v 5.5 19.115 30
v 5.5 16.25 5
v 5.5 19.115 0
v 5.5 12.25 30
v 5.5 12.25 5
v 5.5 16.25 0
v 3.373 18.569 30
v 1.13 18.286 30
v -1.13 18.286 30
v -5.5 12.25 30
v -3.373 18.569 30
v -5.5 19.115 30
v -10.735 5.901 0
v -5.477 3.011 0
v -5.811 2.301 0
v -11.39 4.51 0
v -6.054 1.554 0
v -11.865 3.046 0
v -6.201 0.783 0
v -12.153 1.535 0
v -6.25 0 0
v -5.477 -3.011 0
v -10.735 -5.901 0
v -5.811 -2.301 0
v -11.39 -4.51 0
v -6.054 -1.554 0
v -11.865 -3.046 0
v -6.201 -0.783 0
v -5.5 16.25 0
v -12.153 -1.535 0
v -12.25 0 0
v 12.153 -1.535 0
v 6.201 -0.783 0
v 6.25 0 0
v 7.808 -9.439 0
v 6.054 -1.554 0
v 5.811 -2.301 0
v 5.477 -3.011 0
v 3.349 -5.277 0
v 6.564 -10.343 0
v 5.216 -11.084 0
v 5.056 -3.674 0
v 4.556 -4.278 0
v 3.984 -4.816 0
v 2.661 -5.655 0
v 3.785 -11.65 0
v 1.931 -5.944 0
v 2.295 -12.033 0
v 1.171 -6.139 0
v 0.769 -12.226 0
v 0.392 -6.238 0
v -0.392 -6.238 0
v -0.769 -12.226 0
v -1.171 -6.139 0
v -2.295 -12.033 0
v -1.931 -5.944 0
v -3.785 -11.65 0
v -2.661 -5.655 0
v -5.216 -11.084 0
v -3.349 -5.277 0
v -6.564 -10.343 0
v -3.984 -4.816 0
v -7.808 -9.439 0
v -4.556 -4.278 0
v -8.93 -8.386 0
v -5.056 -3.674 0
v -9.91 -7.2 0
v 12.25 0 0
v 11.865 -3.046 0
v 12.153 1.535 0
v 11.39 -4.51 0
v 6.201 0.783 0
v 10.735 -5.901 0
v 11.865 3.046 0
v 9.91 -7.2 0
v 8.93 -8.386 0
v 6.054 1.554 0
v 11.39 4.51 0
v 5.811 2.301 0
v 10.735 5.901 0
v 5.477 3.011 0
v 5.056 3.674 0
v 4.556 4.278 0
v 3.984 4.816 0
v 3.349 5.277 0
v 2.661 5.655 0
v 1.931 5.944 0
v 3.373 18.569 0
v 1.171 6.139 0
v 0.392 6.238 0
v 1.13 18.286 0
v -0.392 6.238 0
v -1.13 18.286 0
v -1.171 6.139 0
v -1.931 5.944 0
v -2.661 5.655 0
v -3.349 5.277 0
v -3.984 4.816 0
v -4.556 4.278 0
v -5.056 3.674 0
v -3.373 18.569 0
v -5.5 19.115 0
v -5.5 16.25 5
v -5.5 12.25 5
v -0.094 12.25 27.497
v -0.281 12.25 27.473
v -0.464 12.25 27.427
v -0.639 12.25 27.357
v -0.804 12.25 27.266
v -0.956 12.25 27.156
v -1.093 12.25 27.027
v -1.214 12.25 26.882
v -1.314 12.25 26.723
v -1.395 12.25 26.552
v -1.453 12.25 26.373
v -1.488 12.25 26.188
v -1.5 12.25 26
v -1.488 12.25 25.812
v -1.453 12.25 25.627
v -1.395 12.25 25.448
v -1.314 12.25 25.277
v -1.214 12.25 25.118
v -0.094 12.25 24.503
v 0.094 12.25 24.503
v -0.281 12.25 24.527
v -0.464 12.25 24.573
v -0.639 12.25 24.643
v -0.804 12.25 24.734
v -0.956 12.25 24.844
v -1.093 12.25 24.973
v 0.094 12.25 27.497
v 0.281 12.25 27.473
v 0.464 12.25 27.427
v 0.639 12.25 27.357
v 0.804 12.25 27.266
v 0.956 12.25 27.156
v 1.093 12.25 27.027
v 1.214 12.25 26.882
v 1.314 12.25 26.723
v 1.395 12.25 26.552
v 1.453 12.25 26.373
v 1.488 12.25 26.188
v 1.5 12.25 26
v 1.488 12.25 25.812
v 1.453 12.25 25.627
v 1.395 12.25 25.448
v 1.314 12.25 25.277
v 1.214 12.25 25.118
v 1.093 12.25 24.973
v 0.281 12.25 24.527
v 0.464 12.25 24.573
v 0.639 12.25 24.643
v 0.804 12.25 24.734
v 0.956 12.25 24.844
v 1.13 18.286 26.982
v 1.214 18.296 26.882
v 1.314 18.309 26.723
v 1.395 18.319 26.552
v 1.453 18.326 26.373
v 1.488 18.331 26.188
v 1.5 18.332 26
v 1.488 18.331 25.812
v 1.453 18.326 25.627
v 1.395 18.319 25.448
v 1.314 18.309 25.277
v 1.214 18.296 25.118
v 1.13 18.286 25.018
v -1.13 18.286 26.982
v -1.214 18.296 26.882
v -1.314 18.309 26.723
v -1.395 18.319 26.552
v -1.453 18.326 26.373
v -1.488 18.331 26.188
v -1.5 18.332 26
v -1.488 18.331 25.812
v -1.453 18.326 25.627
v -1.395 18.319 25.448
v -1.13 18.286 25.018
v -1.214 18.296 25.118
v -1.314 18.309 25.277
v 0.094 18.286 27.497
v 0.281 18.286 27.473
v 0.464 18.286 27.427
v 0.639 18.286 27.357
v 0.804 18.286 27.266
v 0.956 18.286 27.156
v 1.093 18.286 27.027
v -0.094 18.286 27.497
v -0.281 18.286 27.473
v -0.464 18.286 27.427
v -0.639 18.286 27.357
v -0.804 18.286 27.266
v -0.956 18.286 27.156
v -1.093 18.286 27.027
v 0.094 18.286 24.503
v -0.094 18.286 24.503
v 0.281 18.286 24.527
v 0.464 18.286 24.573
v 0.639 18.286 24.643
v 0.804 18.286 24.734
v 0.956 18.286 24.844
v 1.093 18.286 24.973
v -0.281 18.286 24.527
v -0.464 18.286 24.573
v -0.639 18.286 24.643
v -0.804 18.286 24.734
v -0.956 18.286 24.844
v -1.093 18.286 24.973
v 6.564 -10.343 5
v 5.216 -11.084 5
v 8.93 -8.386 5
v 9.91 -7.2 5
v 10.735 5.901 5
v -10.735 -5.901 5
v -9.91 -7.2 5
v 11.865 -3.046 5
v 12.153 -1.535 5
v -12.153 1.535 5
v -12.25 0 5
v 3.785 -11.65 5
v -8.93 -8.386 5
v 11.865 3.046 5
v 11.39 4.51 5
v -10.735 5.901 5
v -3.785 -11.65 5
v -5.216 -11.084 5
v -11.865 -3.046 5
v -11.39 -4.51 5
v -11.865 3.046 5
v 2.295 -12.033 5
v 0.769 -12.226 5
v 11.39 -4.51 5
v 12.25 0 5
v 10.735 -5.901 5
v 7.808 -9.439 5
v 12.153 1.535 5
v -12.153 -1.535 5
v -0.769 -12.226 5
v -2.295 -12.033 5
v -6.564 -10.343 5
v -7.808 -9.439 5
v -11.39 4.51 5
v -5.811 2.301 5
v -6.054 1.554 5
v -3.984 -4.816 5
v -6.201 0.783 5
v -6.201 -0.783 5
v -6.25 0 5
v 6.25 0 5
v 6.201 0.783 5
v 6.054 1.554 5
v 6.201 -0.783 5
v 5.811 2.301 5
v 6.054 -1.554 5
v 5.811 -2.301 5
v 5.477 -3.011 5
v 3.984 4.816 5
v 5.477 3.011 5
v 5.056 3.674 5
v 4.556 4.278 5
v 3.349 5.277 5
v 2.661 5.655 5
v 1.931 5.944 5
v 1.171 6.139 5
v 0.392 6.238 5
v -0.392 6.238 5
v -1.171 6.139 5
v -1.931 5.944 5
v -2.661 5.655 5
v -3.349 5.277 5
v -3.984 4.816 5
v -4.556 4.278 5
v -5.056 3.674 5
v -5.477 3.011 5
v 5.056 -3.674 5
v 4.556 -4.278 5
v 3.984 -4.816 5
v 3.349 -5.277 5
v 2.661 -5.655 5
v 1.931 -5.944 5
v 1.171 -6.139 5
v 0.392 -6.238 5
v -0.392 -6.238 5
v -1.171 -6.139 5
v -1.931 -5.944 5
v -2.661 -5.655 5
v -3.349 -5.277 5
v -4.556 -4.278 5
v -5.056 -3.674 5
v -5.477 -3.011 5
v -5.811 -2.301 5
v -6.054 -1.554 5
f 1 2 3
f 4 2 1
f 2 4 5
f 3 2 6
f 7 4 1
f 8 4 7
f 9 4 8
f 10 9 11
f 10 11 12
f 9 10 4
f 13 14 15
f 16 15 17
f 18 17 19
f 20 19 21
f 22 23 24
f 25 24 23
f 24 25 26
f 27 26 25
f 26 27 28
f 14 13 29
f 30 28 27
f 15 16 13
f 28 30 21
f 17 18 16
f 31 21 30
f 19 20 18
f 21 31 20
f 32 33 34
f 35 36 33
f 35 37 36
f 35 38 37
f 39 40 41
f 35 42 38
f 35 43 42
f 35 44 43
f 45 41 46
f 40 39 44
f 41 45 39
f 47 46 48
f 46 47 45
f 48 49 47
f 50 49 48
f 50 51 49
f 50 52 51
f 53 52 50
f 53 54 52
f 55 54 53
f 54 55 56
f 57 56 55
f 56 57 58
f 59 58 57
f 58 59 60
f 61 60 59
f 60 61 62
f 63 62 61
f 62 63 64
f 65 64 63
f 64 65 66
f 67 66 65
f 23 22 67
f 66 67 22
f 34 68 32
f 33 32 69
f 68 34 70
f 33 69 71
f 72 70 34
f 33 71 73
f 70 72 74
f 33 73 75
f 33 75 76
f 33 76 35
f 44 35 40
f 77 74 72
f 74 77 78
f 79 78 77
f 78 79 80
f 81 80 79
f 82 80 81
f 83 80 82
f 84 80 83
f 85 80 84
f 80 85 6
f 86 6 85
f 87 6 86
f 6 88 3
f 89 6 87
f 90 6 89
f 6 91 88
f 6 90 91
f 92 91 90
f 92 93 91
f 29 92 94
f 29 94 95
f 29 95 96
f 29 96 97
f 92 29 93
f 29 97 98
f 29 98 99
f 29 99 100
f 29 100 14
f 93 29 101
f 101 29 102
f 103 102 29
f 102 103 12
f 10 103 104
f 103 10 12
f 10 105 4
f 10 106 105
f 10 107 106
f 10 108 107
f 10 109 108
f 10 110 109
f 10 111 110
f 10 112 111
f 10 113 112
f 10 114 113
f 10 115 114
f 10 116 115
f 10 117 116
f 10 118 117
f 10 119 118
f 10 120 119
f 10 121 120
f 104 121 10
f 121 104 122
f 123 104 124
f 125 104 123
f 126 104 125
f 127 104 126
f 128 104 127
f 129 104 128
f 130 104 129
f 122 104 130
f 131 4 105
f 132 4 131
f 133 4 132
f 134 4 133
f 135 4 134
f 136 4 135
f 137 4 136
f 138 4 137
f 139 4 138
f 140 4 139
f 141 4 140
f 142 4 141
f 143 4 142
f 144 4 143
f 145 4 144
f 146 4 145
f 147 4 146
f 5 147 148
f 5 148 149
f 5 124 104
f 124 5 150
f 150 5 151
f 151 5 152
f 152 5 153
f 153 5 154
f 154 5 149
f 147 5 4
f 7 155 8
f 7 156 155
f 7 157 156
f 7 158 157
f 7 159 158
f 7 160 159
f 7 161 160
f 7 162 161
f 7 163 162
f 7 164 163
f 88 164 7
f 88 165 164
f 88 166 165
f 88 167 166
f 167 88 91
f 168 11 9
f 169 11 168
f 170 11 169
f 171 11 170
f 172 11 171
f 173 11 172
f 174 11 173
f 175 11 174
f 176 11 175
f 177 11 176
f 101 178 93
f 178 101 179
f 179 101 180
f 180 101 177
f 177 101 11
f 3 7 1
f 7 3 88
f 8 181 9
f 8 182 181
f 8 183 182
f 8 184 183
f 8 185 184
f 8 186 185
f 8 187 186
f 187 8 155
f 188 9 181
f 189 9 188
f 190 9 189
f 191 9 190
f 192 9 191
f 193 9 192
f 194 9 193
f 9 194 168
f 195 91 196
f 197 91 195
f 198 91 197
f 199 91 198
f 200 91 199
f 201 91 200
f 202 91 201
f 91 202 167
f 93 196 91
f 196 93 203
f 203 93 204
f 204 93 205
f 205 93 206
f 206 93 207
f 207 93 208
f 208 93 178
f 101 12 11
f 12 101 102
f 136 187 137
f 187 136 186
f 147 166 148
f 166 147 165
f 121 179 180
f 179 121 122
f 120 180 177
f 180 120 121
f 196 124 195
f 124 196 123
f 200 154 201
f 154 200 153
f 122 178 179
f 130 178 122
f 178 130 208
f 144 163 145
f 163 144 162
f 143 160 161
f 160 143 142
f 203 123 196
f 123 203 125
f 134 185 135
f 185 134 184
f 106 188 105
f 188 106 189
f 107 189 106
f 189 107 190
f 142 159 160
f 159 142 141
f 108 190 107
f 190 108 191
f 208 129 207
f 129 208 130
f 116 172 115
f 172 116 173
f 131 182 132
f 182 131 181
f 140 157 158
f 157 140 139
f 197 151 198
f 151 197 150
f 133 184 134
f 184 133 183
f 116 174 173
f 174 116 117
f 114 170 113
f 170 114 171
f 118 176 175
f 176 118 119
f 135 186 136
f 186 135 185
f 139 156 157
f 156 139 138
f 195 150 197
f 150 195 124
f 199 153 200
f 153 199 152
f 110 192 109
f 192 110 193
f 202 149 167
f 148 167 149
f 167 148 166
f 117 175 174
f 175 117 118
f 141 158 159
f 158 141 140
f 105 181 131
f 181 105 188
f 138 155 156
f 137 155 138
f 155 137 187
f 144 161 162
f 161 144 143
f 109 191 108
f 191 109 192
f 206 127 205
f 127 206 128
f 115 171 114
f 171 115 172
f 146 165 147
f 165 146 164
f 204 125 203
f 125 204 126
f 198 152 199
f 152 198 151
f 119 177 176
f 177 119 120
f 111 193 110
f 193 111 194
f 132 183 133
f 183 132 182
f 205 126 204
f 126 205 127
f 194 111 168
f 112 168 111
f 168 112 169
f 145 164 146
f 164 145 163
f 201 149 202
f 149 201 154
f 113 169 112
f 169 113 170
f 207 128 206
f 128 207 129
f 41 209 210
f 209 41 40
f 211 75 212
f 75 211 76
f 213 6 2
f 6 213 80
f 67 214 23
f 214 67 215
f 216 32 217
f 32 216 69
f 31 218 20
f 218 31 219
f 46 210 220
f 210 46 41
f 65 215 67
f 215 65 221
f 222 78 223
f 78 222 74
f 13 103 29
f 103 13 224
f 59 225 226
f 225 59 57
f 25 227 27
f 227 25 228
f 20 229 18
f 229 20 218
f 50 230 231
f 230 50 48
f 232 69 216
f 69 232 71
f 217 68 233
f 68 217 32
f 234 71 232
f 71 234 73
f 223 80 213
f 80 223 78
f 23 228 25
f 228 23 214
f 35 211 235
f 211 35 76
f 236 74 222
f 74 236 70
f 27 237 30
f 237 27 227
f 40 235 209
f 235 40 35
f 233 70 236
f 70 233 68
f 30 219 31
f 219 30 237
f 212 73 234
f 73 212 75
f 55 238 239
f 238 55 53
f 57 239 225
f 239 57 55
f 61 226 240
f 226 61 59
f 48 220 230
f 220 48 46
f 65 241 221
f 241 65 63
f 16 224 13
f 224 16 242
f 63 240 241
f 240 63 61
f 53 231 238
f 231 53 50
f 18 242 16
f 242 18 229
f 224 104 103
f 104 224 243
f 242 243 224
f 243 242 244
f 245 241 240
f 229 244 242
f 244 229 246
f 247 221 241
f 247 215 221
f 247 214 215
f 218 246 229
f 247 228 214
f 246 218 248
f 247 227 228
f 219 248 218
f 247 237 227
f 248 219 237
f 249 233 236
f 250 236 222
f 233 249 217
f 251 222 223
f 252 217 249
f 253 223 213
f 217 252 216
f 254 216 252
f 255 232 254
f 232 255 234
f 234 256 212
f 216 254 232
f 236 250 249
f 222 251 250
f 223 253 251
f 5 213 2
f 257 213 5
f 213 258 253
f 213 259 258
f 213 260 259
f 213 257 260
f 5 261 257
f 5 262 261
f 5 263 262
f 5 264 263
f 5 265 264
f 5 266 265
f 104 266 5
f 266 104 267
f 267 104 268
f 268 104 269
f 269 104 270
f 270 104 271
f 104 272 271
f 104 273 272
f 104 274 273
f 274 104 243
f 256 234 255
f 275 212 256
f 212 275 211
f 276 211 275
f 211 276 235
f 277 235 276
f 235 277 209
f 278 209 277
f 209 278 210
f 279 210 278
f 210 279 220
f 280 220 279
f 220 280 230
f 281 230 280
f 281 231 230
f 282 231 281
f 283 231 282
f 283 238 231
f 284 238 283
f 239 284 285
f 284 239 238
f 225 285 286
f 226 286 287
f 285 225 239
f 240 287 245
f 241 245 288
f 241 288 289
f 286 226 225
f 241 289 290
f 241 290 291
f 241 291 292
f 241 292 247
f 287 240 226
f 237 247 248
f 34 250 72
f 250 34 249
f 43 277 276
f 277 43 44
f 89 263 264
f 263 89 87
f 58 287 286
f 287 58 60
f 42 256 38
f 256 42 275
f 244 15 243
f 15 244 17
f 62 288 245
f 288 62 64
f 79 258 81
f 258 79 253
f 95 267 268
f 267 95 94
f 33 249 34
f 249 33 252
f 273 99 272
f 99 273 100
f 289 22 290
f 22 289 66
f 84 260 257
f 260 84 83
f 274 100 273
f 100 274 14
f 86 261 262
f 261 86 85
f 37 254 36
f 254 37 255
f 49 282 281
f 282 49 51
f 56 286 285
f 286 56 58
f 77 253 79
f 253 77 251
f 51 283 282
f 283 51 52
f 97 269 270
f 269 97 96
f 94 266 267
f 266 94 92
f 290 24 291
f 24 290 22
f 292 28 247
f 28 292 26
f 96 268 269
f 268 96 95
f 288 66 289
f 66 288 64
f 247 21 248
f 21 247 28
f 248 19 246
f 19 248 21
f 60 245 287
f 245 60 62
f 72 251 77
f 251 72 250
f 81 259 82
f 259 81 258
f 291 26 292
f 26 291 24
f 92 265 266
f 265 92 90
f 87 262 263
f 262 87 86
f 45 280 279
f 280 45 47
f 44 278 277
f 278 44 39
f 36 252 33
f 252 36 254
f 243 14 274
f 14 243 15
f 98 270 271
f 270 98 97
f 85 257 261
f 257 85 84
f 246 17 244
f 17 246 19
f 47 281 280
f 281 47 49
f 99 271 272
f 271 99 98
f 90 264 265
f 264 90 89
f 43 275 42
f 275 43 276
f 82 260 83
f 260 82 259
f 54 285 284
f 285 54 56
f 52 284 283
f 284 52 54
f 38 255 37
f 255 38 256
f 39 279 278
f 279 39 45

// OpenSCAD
$fn = 50;

length = 30;
diameter = 12.5;
thickness = 12;

height_of_plate=8;
height= 5;
depth = 8;
difference(){
    difference(){
        translate([0, (diameter/2)+(thickness/2)+depth/2, length/2]){
            cube([11, depth, length], center=true);
        }
        translate([0,(diameter/2)+(thickness/2)+(36/2)+depth-2,0]){
            cylinder(r = 36/2, h=length);
        }
    }
    translate([0, (diameter/2)+(thickness/2)+depth, length-(height_of_plate/2)]){
        rotate([90, 0, 0]){
            cylinder(r=1.5, h=depth);
        }
    }
}
difference() {
    hull(){
        translate([0, (diameter/2)+(thickness/2), height / 2]){
            cube([11, 8, height], center=true);
        }

        difference() {
            cylinder(r = (diameter/2)+(thickness / 2), h = height);
            cylinder(r = diameter/2, h = height);
        }
    }
    cylinder(r = diameter/2, h = height);
}
